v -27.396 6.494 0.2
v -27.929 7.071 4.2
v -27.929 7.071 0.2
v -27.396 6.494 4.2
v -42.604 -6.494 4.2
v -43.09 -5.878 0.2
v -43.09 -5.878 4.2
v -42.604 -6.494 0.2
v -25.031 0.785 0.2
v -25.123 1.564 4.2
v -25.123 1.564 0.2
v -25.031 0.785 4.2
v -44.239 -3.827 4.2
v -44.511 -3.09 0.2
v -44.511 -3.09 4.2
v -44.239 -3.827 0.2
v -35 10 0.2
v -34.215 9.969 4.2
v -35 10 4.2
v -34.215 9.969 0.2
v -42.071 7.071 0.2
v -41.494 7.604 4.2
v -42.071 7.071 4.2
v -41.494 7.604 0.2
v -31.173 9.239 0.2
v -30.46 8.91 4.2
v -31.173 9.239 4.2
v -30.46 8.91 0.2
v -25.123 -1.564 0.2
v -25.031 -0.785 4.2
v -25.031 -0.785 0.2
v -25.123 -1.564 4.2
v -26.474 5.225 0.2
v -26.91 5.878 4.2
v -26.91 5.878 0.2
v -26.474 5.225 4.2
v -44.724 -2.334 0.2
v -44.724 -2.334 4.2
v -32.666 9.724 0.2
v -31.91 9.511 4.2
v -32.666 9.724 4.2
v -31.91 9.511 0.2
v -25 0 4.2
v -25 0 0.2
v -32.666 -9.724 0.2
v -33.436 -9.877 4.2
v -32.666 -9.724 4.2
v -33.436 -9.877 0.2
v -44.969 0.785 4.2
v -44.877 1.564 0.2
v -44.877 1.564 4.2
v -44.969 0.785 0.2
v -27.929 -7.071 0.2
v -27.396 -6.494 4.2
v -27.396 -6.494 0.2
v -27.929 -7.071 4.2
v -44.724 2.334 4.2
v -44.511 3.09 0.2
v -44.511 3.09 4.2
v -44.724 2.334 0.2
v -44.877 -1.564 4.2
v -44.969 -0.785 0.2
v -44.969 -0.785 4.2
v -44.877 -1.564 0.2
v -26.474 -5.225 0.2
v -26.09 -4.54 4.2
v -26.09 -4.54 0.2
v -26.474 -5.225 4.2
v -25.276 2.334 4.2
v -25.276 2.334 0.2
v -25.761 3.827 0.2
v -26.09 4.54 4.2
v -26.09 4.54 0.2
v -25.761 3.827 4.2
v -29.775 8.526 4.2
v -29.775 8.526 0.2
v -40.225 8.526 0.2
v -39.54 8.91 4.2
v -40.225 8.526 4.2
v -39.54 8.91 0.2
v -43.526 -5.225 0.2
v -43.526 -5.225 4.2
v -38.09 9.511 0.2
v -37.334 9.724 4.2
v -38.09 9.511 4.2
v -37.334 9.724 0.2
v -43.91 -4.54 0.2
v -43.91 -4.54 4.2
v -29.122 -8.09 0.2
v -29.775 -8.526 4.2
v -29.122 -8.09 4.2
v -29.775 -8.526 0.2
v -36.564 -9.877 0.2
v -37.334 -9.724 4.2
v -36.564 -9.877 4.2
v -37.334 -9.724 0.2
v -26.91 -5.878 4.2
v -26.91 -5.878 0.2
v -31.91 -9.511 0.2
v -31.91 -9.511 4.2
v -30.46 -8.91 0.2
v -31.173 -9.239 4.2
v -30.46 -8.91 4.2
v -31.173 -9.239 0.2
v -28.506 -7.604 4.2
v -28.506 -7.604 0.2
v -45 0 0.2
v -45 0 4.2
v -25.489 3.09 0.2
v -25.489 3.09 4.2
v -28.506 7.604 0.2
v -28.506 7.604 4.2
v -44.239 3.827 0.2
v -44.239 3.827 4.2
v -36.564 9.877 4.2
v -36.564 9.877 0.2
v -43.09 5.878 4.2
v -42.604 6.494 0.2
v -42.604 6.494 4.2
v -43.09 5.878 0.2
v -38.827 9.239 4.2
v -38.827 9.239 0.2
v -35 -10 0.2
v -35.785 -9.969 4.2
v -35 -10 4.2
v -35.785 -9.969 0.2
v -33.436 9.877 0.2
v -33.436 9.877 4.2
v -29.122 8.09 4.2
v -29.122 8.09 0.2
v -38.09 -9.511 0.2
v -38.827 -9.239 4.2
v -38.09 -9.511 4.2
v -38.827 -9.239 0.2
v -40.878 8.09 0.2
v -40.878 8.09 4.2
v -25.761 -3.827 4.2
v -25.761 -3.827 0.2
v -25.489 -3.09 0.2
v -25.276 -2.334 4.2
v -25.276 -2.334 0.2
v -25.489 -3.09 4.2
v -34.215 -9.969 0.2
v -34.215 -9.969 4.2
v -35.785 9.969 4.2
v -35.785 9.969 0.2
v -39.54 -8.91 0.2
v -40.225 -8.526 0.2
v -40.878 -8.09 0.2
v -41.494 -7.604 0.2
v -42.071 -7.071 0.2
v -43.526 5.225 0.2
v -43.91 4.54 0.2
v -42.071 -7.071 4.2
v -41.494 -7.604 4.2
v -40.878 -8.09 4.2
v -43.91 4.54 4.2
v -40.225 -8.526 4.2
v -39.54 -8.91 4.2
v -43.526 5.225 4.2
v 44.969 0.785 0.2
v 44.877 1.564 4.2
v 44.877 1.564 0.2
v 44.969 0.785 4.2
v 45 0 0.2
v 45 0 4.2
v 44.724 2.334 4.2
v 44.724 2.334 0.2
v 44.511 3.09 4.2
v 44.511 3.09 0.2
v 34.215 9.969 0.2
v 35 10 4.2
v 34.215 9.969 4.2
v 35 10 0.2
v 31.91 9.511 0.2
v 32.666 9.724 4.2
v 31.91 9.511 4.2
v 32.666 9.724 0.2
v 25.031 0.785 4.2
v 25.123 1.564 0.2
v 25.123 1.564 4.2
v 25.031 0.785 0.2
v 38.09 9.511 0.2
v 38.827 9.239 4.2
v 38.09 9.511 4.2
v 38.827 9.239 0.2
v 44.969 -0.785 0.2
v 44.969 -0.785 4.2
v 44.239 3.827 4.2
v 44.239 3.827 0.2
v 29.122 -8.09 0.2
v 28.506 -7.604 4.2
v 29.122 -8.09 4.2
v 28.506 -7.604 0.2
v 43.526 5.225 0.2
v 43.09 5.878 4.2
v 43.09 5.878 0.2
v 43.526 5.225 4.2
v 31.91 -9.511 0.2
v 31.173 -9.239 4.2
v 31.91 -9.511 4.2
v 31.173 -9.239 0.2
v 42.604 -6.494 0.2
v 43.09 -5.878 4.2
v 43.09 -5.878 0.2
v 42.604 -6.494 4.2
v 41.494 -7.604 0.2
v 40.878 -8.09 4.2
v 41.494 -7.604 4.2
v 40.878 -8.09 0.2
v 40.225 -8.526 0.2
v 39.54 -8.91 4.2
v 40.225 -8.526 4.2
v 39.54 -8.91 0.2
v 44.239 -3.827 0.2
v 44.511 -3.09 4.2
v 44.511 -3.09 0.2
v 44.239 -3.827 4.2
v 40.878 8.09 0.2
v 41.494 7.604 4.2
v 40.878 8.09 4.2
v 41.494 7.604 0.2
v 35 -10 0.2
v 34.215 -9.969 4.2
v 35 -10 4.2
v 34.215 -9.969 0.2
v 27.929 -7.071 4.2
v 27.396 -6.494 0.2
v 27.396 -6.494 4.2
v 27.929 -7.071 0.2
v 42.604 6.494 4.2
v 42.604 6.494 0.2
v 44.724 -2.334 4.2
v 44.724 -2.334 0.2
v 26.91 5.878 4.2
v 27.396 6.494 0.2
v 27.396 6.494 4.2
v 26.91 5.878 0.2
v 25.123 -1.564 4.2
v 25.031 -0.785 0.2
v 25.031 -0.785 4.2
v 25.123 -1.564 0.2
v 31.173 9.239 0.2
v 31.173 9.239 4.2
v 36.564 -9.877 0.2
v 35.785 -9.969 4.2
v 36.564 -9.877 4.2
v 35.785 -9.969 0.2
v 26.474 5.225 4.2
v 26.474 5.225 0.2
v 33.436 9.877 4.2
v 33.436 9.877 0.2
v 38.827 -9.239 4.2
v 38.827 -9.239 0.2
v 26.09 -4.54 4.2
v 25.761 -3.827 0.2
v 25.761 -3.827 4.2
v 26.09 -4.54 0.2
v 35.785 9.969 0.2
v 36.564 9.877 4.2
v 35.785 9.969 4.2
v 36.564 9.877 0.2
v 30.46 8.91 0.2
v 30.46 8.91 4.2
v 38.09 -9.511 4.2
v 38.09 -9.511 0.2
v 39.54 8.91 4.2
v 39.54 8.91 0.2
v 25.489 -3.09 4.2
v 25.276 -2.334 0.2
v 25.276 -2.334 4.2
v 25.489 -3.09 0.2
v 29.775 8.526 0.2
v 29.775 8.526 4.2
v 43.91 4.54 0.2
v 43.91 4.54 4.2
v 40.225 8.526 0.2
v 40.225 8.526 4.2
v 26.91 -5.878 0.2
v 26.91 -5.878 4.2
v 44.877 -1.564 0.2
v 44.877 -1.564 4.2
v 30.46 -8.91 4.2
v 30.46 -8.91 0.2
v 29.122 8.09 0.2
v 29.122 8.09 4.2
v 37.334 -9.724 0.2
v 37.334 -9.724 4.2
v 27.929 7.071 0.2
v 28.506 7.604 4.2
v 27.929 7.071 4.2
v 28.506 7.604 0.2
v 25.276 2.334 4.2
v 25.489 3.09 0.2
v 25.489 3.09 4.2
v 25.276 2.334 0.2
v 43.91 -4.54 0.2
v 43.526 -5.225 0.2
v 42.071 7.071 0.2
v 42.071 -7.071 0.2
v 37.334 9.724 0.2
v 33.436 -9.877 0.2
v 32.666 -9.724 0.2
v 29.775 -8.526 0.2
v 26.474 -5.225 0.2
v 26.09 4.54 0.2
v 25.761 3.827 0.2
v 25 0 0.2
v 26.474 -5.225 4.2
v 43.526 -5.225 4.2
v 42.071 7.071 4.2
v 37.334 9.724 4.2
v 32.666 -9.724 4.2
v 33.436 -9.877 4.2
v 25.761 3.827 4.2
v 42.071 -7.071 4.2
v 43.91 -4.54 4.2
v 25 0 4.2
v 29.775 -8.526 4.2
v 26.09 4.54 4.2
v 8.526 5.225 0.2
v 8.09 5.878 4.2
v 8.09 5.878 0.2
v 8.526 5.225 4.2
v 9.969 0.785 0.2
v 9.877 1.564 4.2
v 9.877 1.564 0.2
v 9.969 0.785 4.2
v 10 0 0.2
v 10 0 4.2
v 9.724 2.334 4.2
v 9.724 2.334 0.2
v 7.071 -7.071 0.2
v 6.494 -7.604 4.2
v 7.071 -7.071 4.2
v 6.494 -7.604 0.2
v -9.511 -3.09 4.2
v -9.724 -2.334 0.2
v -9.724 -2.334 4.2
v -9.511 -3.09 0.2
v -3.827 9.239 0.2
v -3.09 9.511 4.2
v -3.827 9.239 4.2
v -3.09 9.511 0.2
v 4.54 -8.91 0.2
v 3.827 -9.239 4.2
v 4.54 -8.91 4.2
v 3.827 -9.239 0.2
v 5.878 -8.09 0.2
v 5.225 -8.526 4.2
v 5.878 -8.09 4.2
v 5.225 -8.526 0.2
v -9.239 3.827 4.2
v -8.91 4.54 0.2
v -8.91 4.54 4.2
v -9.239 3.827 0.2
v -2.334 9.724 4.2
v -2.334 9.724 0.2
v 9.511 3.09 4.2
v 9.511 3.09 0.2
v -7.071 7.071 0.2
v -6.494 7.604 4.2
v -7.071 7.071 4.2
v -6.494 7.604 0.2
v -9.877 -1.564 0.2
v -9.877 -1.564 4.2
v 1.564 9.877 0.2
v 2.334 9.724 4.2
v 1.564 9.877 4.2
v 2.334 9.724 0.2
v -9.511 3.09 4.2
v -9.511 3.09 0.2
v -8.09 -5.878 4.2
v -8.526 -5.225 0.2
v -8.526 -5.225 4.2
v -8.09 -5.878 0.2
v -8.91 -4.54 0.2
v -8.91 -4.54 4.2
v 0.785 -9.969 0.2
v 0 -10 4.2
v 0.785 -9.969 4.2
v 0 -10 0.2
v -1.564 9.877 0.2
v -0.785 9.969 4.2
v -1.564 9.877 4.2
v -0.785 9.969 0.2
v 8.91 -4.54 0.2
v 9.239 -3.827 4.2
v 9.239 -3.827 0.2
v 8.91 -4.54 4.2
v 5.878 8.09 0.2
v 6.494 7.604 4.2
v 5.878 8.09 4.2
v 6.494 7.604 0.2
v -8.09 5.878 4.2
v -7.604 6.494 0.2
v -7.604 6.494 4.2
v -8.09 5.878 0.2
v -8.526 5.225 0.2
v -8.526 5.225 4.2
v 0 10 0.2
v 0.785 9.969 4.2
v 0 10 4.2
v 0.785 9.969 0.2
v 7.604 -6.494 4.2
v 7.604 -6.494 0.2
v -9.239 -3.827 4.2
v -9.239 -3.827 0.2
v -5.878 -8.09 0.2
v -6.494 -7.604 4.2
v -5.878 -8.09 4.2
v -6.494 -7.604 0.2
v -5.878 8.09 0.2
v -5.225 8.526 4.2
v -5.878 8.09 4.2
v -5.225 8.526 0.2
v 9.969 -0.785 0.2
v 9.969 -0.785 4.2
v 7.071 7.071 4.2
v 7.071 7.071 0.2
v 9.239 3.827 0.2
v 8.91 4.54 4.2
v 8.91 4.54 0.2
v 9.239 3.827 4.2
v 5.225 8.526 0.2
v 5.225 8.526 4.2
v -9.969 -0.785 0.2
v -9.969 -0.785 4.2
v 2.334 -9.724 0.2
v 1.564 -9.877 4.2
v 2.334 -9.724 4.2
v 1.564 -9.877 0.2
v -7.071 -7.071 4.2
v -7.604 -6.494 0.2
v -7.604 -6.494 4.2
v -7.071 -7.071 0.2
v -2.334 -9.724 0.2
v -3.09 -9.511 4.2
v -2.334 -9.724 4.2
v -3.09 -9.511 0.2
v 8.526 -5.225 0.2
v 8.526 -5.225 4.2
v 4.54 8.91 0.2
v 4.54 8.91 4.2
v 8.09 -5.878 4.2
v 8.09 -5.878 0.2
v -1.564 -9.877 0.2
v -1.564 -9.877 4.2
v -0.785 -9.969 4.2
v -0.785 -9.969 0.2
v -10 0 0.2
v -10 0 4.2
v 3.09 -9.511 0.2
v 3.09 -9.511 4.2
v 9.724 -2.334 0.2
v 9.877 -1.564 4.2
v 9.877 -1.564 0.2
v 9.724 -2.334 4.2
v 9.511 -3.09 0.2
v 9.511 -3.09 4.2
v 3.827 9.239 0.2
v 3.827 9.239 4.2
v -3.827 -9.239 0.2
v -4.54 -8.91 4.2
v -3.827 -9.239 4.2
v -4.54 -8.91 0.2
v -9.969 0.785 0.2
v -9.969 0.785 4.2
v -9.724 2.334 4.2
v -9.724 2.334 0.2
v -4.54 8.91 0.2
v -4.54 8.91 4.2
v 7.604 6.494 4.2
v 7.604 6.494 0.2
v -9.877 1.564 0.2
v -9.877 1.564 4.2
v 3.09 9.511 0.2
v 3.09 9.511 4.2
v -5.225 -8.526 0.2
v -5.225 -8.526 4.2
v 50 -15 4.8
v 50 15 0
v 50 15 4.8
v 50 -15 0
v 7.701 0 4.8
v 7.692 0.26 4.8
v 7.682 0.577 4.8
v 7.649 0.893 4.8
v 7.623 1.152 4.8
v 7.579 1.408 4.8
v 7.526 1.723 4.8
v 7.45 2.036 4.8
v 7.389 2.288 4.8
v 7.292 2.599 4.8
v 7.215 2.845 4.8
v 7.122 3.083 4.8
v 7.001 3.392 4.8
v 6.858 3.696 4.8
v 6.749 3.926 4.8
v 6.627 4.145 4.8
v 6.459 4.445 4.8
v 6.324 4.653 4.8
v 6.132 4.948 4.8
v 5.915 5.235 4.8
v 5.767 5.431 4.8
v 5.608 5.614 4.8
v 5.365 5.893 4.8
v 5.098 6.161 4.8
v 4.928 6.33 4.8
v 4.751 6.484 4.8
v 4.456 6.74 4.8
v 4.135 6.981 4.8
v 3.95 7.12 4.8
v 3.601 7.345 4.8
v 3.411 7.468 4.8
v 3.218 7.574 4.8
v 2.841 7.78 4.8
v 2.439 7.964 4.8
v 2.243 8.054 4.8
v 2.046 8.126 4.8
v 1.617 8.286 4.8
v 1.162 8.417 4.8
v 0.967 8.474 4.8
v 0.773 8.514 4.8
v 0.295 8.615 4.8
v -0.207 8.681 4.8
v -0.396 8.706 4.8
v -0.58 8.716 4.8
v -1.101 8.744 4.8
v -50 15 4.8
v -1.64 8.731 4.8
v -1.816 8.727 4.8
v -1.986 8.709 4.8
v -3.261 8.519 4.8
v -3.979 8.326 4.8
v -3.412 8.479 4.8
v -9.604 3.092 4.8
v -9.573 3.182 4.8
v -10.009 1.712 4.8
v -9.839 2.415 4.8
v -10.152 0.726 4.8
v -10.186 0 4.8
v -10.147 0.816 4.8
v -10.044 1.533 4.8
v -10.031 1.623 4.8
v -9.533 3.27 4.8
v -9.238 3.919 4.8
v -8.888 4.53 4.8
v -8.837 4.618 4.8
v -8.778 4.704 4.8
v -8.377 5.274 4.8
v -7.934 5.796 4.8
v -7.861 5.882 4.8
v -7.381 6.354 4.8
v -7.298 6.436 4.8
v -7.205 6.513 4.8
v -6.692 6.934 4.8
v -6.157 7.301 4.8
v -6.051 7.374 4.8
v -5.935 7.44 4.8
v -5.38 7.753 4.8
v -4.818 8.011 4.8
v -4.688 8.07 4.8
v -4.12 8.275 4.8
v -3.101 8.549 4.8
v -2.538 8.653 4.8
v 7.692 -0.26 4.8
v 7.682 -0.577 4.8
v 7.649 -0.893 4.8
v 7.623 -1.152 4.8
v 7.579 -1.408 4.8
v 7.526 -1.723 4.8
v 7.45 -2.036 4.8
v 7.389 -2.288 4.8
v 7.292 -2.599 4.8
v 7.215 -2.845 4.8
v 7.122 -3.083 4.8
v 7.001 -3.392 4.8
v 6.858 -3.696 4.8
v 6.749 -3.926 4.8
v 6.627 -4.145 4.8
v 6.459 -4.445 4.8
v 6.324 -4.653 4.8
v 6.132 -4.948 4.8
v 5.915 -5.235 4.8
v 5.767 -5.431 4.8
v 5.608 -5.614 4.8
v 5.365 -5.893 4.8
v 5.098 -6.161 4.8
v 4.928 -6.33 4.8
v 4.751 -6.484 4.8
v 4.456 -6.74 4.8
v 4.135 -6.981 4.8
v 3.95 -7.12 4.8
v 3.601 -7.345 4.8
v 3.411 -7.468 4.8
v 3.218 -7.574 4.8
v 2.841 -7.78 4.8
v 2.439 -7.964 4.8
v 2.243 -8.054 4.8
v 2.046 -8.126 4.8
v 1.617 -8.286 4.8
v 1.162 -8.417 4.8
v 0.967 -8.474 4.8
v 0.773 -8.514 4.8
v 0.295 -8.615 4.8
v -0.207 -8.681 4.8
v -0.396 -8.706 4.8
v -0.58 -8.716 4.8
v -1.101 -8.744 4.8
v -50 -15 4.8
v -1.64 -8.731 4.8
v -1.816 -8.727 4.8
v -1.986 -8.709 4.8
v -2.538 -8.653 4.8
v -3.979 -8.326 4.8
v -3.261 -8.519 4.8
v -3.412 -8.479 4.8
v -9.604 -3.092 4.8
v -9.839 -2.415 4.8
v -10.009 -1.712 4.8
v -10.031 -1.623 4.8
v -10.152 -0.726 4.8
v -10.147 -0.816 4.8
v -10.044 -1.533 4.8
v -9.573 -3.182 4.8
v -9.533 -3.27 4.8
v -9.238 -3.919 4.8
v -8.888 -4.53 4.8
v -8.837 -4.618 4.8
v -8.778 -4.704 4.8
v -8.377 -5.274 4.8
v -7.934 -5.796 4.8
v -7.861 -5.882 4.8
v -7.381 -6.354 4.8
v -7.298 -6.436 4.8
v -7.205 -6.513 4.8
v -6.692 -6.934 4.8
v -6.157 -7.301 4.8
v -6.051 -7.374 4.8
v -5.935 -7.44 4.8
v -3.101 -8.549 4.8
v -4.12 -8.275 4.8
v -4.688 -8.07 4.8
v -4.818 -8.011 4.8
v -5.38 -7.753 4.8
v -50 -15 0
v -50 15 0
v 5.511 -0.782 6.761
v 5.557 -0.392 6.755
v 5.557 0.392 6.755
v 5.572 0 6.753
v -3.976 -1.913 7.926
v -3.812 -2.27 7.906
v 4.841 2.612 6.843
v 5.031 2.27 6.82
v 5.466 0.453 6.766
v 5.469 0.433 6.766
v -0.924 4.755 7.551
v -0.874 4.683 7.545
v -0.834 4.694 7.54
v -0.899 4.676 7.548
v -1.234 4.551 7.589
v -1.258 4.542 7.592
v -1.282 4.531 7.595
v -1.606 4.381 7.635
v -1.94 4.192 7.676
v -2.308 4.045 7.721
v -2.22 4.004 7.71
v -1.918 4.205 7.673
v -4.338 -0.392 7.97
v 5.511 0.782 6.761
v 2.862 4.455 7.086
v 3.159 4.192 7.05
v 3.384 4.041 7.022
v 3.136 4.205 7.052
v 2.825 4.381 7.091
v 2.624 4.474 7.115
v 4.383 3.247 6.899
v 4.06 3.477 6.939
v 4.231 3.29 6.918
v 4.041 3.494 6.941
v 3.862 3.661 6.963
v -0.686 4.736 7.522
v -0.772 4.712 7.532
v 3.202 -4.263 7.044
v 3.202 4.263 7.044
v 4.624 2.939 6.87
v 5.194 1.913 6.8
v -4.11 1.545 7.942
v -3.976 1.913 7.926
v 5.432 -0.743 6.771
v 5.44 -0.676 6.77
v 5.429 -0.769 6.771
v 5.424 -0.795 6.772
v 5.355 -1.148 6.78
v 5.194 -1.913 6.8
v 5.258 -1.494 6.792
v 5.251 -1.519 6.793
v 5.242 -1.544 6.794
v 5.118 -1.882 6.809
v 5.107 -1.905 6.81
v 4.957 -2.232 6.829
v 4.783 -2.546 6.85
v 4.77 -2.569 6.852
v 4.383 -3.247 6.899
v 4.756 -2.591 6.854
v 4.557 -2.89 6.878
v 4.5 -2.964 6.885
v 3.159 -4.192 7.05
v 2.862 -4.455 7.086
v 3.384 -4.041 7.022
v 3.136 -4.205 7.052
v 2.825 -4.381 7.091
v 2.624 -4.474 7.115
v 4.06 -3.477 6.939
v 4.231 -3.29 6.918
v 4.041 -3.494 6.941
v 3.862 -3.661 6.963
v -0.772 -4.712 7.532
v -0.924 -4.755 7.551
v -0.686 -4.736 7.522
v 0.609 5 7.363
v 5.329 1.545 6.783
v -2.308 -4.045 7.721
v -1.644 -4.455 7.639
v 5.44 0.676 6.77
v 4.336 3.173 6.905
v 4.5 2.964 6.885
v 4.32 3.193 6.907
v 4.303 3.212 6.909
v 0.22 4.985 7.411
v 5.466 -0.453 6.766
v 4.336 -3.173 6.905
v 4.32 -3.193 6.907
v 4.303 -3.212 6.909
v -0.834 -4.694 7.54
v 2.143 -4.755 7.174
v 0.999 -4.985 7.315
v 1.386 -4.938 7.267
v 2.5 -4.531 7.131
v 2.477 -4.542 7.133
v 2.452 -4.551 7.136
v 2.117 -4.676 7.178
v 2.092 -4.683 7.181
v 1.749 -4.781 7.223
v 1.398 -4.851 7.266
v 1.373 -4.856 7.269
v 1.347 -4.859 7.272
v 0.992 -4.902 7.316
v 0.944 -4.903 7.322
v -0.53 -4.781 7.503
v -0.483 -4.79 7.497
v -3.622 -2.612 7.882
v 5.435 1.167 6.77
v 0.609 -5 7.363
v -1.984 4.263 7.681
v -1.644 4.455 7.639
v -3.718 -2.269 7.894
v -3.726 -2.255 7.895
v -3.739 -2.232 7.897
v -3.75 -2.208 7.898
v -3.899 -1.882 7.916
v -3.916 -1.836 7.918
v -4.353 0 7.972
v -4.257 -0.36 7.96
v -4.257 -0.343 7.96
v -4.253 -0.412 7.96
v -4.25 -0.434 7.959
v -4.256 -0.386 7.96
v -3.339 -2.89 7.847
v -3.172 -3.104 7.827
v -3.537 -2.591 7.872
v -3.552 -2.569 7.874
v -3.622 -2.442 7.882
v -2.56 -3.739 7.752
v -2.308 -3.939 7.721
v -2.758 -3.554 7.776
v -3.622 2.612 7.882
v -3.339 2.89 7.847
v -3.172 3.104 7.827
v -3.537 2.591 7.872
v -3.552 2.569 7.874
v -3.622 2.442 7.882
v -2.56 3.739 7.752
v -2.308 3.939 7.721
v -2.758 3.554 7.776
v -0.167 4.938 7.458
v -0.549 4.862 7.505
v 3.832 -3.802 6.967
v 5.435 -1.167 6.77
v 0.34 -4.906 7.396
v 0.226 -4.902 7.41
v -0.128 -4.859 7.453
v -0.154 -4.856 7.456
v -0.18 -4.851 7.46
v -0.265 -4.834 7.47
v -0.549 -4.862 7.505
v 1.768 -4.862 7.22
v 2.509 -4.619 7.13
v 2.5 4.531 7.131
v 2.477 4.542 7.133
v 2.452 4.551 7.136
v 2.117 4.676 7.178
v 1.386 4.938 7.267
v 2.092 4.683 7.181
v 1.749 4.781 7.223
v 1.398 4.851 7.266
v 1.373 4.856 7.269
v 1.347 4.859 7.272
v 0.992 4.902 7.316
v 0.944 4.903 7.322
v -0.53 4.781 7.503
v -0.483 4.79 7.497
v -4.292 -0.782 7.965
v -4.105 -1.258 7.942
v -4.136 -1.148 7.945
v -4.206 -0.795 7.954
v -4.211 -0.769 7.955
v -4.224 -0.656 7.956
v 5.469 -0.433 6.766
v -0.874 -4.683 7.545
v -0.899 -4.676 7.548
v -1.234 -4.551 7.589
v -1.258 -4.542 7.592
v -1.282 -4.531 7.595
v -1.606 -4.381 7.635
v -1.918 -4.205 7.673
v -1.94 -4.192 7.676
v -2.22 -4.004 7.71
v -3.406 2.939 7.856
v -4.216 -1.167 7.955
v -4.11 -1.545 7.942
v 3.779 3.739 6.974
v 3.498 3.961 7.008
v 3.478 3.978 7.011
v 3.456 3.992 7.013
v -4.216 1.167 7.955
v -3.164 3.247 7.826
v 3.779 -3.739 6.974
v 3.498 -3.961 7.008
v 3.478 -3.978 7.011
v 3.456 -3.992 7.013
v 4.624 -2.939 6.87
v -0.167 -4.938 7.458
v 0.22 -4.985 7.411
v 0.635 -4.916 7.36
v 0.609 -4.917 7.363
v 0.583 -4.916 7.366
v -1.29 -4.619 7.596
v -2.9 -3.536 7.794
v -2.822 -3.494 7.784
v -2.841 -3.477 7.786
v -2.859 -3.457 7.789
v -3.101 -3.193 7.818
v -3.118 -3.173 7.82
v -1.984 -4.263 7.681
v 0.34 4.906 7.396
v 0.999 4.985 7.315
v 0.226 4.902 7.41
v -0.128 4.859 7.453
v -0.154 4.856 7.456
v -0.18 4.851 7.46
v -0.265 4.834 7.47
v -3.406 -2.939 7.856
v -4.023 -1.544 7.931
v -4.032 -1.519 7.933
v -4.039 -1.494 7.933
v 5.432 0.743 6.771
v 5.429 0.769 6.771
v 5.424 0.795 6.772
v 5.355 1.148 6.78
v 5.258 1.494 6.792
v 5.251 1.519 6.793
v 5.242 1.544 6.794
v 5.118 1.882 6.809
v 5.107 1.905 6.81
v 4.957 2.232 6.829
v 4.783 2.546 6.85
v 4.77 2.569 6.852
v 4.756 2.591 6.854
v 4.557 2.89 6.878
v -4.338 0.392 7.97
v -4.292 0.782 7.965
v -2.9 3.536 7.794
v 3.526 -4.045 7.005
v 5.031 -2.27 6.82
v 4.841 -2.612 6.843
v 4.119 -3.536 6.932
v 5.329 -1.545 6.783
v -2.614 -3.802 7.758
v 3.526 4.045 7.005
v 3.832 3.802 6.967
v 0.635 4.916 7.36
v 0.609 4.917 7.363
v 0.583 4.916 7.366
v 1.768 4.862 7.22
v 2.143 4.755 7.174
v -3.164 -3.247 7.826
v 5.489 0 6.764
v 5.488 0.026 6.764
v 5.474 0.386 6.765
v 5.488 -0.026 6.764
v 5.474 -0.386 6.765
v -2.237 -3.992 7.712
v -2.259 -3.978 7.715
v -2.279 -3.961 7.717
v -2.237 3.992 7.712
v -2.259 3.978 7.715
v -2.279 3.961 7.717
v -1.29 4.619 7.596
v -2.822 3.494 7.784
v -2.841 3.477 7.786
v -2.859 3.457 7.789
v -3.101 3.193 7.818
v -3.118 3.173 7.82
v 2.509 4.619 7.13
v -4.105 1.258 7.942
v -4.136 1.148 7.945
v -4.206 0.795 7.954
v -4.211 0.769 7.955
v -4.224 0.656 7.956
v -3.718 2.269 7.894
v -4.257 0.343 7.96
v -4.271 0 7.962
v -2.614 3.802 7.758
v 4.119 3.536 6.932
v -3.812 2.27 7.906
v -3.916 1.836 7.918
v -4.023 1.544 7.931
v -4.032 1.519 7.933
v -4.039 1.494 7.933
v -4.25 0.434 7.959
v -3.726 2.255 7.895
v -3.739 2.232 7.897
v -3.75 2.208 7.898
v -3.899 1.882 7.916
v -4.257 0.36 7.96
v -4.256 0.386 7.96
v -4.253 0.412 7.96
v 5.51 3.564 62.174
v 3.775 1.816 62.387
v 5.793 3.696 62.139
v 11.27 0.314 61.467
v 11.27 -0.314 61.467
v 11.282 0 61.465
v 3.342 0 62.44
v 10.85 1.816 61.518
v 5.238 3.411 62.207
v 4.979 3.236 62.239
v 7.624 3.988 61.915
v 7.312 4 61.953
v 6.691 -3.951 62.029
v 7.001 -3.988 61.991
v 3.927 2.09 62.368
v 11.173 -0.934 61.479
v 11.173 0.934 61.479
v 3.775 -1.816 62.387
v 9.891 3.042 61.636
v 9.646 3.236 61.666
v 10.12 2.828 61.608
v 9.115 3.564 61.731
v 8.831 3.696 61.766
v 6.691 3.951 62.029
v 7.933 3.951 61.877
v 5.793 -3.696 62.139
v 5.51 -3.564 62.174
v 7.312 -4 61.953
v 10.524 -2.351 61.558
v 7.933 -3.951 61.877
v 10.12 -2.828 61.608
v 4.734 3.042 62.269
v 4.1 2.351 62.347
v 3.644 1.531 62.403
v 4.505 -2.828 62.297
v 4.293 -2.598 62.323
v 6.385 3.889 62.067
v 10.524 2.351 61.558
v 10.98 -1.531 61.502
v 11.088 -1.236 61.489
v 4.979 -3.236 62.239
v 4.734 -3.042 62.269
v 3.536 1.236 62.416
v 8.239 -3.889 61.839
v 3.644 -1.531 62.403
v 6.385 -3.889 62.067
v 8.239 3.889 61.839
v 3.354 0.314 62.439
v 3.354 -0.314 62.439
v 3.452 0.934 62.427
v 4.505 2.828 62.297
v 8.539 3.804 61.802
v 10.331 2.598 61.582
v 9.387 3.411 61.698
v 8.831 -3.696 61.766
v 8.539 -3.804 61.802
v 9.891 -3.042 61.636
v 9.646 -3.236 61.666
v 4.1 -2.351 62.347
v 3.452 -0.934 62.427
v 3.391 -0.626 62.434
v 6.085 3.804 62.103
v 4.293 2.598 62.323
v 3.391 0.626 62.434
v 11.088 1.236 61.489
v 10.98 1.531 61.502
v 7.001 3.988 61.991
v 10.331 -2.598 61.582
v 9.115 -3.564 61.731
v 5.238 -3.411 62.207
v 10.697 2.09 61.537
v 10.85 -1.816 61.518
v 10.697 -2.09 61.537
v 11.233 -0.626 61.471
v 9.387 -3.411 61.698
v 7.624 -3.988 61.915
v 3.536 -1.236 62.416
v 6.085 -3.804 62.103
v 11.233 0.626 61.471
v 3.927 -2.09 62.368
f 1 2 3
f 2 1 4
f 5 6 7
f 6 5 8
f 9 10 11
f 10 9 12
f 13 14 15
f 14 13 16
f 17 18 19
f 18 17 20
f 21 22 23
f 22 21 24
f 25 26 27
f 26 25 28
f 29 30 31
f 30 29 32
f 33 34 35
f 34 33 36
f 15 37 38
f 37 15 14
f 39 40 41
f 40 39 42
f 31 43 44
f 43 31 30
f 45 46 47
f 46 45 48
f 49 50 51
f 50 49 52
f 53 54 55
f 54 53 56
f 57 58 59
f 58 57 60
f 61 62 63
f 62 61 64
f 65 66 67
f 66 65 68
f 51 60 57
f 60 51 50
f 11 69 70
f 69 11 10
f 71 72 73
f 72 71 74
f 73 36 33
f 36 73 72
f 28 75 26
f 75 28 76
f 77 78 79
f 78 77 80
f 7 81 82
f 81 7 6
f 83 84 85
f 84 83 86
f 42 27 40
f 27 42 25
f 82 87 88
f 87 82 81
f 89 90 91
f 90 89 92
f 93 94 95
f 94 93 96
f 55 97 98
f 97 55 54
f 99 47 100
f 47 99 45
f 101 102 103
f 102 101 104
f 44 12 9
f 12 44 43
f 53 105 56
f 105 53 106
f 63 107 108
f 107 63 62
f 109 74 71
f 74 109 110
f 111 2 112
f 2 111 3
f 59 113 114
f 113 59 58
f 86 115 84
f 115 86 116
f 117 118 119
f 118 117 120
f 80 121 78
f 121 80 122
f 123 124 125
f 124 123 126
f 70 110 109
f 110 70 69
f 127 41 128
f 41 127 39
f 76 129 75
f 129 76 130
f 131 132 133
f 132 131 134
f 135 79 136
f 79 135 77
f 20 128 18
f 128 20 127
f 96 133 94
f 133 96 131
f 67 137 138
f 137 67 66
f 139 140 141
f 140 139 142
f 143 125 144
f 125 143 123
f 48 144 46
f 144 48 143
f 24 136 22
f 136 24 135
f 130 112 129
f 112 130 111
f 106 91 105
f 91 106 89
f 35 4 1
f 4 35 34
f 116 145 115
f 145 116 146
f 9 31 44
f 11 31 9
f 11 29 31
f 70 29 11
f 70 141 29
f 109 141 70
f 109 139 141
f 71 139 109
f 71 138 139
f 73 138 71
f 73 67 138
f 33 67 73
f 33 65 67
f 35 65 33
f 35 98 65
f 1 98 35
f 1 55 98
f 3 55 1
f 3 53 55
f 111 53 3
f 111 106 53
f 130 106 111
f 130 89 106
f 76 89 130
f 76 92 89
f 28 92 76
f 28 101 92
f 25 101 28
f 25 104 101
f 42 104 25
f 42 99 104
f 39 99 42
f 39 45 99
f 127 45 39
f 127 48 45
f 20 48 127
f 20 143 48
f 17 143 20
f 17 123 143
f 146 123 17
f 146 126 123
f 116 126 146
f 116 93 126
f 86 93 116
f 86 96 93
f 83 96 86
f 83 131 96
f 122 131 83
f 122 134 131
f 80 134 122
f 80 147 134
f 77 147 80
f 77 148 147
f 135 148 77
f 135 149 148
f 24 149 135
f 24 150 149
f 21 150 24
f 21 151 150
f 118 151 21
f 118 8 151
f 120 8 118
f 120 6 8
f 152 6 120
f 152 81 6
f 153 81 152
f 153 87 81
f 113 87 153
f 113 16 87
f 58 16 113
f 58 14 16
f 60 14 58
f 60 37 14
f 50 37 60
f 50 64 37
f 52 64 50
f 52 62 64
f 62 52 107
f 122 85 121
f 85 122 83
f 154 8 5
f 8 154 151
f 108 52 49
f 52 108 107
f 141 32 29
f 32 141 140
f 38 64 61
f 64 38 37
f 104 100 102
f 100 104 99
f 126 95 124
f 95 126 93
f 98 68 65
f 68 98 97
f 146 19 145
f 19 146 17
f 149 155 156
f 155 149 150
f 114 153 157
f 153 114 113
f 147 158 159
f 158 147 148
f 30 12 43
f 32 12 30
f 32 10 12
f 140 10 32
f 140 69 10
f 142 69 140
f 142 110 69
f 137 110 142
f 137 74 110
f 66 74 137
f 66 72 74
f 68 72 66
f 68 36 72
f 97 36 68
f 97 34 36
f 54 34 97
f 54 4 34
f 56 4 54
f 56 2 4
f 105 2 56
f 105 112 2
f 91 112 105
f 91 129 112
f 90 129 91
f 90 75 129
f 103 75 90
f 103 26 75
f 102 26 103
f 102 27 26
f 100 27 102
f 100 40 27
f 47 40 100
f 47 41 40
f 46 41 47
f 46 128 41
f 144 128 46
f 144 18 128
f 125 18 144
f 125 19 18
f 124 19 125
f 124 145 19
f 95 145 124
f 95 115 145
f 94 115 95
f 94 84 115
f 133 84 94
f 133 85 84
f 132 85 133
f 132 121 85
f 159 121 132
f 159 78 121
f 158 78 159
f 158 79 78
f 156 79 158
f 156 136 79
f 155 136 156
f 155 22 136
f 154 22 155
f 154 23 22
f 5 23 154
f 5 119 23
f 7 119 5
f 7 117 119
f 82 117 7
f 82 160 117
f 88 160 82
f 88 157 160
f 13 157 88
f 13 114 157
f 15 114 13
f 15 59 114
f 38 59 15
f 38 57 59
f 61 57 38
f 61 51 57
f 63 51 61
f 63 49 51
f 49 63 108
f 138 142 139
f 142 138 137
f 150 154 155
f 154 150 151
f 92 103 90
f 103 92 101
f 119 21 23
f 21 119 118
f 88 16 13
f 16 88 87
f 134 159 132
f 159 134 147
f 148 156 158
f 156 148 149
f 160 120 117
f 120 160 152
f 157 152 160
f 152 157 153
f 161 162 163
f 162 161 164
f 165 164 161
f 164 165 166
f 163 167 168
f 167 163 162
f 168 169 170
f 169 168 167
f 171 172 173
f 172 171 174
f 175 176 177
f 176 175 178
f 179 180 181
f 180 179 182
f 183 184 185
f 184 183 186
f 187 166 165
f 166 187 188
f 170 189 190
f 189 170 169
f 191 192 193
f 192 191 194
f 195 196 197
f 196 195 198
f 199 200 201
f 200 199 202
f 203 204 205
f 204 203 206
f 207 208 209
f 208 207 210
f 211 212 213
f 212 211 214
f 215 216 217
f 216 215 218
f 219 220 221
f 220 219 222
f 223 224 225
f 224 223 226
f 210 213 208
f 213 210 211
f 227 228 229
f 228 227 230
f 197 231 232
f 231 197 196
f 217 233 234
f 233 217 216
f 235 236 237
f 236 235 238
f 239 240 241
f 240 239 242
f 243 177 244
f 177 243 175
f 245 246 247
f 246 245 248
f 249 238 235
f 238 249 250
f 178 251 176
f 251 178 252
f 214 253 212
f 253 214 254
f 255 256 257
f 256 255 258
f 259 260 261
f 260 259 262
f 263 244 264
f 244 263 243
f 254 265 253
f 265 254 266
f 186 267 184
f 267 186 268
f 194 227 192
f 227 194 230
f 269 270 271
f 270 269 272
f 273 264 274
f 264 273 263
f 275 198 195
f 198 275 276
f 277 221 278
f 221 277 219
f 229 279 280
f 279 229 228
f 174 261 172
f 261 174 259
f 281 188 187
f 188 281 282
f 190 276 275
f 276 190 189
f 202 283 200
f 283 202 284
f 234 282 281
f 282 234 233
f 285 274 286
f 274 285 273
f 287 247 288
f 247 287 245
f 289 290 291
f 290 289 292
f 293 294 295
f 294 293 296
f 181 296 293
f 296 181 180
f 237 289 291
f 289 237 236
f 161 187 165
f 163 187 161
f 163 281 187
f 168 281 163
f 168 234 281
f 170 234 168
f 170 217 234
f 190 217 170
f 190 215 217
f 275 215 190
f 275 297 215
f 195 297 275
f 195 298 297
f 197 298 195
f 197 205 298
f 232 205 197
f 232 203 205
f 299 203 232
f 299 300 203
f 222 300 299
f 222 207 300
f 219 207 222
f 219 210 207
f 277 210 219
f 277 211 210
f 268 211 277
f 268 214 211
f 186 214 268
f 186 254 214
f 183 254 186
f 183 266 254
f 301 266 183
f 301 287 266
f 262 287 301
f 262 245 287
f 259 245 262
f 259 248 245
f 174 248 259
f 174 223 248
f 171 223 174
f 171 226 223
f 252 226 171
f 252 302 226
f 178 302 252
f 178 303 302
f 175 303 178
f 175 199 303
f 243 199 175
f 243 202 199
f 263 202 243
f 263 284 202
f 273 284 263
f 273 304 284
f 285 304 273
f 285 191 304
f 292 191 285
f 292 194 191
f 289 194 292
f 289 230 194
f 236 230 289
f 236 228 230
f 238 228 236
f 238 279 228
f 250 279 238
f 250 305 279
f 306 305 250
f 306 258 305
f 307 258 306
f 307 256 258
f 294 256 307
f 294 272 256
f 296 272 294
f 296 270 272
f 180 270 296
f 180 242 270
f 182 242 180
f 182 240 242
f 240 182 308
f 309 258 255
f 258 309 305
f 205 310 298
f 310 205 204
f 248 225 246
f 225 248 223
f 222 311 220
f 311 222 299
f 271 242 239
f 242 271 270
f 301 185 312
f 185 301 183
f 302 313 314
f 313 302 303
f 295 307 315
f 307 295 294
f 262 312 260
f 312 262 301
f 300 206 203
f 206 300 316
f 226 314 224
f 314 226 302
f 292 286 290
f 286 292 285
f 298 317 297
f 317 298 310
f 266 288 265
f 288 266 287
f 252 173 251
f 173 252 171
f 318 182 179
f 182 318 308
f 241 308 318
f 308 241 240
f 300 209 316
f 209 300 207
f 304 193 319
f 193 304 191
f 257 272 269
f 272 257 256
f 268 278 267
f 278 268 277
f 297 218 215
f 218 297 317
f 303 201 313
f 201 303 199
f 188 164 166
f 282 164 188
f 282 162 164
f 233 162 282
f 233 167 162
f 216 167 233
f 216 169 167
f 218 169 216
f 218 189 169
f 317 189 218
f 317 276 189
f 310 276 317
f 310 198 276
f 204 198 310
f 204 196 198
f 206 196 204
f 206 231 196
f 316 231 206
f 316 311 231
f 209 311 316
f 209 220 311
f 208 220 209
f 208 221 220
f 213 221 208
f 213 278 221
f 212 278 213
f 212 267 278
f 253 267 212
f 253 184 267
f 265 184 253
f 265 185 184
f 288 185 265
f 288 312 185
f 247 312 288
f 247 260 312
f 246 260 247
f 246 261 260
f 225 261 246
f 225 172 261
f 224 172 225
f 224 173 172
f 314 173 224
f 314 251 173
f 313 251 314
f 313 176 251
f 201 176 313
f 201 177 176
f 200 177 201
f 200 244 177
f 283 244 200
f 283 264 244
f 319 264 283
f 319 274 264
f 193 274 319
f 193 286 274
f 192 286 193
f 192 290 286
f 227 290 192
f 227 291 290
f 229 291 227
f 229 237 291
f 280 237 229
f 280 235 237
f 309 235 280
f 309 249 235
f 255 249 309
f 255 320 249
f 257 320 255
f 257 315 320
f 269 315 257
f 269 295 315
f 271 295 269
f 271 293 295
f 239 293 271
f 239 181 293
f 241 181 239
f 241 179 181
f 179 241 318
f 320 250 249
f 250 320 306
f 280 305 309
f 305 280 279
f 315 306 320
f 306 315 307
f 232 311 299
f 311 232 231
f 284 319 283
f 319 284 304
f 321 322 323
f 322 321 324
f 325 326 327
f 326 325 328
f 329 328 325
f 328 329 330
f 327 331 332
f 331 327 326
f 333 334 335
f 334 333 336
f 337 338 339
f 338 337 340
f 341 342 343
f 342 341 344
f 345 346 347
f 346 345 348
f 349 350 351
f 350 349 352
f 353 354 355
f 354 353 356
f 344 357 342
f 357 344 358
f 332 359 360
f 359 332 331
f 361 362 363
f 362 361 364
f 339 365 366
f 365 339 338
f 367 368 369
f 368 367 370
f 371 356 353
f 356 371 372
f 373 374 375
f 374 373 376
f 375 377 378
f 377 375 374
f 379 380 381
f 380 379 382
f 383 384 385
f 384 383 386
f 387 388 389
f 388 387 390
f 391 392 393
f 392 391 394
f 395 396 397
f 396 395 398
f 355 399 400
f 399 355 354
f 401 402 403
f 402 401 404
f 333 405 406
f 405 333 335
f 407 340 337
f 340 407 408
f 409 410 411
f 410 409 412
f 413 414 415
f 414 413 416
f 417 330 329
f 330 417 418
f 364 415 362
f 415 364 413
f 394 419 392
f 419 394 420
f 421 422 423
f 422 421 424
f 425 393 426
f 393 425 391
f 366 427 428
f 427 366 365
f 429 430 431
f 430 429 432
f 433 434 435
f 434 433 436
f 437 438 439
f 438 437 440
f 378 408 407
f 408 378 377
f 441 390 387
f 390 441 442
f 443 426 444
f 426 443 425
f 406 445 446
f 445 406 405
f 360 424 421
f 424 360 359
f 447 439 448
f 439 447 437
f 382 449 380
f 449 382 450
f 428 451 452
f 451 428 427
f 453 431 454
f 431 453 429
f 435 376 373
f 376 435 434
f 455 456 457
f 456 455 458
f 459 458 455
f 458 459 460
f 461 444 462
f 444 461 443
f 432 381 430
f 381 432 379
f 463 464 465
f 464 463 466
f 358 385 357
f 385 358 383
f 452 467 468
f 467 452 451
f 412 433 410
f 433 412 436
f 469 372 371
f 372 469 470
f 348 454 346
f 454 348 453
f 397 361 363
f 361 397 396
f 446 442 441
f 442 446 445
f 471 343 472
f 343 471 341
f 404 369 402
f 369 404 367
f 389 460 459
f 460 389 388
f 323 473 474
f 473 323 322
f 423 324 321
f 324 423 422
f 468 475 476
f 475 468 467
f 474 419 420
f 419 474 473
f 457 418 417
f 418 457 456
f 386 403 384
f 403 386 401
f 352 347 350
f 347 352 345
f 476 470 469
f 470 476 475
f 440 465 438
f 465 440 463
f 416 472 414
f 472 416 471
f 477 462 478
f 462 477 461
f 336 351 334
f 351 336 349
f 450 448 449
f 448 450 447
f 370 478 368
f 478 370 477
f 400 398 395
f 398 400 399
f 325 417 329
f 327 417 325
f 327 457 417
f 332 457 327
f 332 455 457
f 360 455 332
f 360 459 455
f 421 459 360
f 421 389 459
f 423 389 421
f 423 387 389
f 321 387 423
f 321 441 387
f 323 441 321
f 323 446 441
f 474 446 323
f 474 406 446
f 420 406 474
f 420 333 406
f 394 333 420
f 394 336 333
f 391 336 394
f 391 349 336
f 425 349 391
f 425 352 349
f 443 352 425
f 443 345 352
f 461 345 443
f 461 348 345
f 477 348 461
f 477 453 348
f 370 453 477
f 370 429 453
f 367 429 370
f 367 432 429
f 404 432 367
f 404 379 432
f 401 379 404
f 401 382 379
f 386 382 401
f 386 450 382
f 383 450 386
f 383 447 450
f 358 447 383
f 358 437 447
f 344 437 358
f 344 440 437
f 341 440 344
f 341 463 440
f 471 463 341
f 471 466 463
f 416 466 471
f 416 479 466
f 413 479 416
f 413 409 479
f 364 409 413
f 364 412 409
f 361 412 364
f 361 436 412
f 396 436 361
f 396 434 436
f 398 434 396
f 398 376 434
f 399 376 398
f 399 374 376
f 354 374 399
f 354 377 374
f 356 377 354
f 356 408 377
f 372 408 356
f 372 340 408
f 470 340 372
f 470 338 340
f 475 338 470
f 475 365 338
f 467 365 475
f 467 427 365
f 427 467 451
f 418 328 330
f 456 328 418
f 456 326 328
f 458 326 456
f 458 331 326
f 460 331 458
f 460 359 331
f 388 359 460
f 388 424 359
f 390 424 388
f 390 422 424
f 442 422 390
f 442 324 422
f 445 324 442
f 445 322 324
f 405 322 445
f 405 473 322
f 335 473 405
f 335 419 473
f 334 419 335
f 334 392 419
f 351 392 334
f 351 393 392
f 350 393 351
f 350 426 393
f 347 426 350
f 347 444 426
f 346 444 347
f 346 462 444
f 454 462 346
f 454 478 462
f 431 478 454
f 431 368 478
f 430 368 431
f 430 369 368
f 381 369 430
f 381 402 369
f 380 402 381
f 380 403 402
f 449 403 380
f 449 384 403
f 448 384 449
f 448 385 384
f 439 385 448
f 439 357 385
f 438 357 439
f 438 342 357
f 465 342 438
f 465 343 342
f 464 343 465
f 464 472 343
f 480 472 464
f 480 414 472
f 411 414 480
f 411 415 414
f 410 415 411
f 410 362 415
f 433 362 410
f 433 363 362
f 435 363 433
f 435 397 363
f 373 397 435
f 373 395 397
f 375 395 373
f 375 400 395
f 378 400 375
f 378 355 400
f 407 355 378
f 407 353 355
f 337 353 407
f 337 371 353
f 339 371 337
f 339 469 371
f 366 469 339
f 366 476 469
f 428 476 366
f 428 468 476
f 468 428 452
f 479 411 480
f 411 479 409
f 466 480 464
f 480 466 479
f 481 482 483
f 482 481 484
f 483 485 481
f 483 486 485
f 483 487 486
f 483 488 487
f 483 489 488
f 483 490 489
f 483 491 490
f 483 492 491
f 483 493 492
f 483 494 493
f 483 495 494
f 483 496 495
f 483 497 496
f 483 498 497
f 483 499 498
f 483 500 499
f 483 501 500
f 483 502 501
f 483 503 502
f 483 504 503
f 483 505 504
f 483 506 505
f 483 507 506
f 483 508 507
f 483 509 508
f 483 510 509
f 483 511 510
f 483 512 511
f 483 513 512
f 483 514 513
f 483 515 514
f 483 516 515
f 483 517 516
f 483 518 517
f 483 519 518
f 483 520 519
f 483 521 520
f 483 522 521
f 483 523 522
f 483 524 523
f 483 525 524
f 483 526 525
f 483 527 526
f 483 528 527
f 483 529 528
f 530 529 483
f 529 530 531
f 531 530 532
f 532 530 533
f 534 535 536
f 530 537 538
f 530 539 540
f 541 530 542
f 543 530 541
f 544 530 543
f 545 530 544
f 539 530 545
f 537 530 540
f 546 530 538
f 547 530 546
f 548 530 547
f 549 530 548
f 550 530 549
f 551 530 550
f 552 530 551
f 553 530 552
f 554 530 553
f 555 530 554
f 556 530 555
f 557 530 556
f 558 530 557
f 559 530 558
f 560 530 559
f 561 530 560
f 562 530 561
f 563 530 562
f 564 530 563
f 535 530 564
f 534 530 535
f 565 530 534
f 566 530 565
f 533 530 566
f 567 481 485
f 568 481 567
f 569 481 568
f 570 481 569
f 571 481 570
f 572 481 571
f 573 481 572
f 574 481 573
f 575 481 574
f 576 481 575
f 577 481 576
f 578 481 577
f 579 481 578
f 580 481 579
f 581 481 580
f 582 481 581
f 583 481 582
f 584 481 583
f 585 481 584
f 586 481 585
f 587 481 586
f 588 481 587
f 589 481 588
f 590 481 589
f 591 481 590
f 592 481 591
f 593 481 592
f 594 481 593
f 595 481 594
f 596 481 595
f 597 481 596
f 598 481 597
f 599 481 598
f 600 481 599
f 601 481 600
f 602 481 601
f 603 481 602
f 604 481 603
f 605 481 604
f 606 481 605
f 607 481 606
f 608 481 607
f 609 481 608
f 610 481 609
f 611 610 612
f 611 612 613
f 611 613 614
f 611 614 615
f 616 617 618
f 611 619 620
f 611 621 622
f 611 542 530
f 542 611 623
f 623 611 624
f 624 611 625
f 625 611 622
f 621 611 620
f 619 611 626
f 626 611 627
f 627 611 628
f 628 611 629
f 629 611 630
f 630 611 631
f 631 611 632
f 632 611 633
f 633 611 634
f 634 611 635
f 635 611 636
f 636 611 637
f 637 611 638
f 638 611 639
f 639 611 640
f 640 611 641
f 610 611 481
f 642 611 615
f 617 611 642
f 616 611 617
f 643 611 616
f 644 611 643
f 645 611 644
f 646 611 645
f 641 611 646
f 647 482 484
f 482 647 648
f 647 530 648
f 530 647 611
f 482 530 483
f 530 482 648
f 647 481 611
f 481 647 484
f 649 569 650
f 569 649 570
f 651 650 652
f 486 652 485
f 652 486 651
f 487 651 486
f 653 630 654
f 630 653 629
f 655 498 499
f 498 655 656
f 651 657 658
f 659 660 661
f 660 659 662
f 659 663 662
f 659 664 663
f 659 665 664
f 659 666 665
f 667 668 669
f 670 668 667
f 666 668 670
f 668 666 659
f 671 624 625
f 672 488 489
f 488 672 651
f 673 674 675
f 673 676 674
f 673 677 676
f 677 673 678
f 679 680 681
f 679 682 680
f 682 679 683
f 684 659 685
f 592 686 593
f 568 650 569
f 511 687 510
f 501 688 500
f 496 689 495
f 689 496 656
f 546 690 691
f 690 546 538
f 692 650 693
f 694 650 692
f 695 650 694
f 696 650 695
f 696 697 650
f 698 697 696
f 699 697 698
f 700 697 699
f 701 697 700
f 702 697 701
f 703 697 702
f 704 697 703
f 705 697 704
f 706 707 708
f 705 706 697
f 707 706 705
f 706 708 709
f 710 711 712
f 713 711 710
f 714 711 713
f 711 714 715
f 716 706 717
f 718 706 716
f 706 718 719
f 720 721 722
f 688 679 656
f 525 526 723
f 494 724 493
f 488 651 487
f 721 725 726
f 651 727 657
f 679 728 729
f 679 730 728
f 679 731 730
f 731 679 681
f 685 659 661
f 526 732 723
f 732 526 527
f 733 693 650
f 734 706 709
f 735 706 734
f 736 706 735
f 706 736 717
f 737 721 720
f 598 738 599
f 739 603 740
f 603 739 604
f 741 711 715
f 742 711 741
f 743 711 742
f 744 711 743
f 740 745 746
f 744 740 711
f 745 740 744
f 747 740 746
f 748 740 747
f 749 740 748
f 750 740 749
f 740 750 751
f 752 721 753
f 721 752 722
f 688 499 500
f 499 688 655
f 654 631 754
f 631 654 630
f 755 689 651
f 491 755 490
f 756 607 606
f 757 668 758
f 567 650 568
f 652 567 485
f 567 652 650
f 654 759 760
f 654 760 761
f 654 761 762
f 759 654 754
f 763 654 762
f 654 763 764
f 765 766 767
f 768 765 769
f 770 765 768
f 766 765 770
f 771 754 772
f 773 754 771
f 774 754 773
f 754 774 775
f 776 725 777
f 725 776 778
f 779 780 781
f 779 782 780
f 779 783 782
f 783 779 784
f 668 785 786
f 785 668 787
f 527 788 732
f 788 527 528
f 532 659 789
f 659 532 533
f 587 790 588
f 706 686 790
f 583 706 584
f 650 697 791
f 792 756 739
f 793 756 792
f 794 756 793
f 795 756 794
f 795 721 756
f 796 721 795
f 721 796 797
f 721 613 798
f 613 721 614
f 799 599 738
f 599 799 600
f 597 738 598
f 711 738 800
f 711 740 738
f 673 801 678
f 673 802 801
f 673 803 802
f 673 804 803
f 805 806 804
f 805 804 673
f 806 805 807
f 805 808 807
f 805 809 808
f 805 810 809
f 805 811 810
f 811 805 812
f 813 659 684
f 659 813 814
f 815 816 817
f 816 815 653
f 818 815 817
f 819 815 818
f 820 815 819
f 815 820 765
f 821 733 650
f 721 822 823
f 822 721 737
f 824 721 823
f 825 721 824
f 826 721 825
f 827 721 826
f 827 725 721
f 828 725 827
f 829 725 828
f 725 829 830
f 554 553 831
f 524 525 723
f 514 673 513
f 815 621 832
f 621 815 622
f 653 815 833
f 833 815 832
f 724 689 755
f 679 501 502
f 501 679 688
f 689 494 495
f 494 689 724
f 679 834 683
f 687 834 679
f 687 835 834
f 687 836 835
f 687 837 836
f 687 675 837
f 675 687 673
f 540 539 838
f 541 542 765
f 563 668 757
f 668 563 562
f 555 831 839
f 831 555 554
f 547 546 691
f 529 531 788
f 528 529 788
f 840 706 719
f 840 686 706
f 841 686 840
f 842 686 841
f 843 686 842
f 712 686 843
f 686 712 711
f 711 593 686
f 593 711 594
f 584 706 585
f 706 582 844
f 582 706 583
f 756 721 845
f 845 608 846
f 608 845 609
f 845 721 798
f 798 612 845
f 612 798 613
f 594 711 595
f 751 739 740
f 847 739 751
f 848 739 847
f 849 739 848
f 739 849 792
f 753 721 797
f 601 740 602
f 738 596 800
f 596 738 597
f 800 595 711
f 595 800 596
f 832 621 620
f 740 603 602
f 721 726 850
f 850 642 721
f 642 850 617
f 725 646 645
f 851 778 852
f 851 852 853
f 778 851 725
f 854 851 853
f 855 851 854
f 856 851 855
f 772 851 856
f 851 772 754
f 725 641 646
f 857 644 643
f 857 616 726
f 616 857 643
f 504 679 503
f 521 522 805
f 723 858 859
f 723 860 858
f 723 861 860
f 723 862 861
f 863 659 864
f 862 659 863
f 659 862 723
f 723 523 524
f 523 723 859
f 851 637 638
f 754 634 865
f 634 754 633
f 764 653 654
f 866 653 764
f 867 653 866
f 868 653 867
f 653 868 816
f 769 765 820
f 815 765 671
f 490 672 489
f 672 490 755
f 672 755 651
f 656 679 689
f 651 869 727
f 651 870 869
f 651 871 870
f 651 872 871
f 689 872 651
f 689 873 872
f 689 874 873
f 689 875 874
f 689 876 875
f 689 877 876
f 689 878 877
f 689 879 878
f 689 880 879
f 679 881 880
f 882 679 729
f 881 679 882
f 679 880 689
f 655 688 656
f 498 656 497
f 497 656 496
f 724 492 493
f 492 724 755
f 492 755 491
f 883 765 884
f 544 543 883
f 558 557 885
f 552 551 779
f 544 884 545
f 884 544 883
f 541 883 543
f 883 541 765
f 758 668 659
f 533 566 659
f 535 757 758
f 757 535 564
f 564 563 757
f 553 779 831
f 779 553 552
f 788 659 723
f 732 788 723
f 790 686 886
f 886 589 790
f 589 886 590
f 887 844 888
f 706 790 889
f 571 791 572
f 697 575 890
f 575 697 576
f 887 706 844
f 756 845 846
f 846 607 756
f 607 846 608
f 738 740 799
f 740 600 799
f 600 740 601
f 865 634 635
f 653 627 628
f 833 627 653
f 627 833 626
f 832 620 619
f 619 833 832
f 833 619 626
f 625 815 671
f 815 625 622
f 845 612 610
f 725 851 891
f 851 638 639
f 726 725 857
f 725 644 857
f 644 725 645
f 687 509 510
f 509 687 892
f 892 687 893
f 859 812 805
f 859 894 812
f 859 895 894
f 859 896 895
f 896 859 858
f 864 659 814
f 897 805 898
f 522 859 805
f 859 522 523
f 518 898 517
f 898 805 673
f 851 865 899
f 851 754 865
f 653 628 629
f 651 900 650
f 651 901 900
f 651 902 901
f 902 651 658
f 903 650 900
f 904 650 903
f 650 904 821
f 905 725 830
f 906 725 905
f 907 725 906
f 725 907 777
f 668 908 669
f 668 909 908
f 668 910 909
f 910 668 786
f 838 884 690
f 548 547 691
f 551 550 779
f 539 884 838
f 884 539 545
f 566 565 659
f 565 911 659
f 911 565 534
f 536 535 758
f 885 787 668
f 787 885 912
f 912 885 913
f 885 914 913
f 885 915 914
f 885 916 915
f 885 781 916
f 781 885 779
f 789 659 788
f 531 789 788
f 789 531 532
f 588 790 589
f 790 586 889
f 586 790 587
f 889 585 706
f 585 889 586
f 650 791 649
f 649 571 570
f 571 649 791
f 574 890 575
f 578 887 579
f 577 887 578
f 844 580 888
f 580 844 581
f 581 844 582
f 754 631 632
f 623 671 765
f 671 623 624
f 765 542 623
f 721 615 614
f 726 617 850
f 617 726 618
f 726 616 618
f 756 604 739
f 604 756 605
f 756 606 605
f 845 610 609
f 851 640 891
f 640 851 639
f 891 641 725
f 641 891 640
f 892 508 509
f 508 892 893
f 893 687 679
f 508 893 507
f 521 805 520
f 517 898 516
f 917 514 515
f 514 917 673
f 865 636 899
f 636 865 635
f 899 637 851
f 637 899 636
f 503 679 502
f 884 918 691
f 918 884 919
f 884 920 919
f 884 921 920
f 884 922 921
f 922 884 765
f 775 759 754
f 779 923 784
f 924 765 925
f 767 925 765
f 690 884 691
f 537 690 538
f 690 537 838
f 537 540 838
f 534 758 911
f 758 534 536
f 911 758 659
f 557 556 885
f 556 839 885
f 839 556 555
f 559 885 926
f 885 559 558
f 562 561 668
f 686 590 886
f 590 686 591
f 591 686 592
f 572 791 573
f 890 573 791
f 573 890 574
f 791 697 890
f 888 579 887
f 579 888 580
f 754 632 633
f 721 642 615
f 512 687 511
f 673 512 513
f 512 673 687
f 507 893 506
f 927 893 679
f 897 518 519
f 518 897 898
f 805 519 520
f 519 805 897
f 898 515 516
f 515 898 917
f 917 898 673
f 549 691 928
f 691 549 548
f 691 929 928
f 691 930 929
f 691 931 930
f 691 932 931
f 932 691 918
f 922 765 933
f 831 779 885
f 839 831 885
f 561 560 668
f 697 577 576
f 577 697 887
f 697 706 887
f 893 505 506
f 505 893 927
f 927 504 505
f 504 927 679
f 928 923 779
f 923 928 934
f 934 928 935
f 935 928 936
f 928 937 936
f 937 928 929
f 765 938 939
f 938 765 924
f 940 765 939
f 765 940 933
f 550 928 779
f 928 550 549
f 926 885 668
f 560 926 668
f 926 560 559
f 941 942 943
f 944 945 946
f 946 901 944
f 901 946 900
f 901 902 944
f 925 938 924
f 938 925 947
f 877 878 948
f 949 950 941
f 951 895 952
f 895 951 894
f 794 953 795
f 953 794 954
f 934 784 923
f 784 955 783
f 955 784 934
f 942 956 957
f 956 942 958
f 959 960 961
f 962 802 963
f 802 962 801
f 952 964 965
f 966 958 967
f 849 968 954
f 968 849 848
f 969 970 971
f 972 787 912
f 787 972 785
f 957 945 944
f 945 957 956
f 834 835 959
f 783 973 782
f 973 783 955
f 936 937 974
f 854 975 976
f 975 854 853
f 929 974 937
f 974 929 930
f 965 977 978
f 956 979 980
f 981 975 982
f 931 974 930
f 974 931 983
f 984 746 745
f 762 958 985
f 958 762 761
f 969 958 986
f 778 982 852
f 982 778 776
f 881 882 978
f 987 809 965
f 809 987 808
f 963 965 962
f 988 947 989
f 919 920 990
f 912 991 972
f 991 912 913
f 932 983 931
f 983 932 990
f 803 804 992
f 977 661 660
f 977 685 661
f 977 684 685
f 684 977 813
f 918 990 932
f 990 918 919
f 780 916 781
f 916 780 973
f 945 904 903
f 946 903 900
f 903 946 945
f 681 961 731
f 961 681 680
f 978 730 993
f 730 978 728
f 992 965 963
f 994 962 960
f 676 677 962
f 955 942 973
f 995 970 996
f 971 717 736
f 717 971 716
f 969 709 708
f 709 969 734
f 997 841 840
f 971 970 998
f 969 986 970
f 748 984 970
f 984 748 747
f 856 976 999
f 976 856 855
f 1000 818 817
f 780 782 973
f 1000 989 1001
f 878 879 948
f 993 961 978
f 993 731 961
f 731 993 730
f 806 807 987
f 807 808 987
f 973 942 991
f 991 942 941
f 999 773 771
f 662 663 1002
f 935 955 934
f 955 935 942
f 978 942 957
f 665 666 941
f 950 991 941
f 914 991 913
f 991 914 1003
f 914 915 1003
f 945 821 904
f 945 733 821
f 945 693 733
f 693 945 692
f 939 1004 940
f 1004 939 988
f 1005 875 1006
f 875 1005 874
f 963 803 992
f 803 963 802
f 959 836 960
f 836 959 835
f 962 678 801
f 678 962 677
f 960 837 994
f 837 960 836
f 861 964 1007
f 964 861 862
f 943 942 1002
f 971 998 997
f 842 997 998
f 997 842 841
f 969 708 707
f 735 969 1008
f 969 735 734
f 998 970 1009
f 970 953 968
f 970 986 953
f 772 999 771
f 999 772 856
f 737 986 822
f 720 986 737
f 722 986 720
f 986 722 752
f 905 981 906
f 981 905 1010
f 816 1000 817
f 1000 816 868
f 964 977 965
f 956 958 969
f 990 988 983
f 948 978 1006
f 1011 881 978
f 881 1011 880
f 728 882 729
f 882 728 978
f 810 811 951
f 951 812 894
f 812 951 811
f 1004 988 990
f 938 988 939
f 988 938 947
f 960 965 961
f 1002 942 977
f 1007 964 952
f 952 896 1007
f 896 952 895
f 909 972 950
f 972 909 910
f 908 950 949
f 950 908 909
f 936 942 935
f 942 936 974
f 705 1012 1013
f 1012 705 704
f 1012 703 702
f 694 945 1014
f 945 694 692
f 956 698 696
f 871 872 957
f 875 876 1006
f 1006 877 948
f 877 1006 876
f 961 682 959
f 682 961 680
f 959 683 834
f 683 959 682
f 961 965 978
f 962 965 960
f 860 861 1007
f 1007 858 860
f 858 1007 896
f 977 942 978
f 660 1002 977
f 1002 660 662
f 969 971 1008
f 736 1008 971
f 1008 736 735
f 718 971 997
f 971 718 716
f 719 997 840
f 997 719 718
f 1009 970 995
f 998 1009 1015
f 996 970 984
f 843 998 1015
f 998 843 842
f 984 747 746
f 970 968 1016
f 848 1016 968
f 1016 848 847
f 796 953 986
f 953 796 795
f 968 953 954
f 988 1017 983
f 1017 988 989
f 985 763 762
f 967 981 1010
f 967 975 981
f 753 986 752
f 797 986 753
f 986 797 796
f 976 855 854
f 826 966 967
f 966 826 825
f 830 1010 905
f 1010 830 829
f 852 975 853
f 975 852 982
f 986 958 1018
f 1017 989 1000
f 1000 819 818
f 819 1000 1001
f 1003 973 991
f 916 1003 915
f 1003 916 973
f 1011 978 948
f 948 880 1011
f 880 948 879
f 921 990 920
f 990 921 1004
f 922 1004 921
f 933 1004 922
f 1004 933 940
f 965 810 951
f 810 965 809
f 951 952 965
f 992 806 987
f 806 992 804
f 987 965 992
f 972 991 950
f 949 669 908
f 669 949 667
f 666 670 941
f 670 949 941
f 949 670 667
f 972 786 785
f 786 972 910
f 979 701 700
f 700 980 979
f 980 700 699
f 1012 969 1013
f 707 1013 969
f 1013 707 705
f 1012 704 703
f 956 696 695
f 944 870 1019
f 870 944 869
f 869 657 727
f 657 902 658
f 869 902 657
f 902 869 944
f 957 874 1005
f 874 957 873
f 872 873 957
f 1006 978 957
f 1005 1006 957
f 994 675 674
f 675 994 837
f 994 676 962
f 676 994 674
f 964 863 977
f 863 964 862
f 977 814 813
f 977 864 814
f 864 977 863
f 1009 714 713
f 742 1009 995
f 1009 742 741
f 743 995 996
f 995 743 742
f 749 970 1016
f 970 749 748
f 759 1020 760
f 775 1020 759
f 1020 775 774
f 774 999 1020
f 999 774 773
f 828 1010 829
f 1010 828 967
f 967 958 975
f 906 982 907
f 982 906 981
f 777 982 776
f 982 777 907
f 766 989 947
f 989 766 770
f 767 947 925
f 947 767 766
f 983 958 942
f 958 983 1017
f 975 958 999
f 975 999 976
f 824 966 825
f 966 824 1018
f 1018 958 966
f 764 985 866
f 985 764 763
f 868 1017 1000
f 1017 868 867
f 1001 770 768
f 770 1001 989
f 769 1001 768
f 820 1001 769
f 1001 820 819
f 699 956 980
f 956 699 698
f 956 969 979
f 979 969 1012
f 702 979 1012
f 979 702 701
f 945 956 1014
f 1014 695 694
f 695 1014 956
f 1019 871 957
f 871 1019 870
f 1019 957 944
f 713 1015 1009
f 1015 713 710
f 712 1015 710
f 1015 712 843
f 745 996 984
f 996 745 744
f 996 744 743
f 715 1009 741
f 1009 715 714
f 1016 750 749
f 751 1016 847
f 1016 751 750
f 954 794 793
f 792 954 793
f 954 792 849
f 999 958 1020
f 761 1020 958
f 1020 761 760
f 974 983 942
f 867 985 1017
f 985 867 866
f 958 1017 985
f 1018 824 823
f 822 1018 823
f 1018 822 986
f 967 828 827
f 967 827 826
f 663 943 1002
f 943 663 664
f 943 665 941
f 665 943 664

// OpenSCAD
$fn=80;

magnet_amount = 2;
magnet_height = 2;
magnet_diameter = 10;

baseplate_width = magnet_diameter+20;
baseplate_height = magnet_amount*magnet_height+0.2+0.6; //0.2 = bottom thickness (low --> good magnet strength), 0.6 = top thickness

difference(){
  baseplate();
  union(){
    translate([-35,0,0.2]) magnet_cavity();
    translate([35,0,0.2]) magnet_cavity();
    translate([0,0,0.2]) magnet_cavity();
  }
}
hook();

module baseplate(){
  translate([0,0,(magnet_amount*magnet_height+0.2+0.6)/2])
  cube([100,baseplate_width,baseplate_height], center=true); //thickness: 4mm for magnets    
}

module magnet_cavity() {
  cylinder(h=magnet_height*magnet_amount, r=magnet_diameter);
}

module hook() {
  difference(){   
     translate([0,0,baseplate_height/2]) 
       rotate([0,7,0]) 
       cylinder(h=5, r1=12, r2=5);
     baseplate();
  }

  difference(){
    translate([0,0,baseplate_height/2]) 
      rotate([0,7,0]) 
      cylinder(h=60, r1=5, r2=4);
    baseplate();
  }
}
